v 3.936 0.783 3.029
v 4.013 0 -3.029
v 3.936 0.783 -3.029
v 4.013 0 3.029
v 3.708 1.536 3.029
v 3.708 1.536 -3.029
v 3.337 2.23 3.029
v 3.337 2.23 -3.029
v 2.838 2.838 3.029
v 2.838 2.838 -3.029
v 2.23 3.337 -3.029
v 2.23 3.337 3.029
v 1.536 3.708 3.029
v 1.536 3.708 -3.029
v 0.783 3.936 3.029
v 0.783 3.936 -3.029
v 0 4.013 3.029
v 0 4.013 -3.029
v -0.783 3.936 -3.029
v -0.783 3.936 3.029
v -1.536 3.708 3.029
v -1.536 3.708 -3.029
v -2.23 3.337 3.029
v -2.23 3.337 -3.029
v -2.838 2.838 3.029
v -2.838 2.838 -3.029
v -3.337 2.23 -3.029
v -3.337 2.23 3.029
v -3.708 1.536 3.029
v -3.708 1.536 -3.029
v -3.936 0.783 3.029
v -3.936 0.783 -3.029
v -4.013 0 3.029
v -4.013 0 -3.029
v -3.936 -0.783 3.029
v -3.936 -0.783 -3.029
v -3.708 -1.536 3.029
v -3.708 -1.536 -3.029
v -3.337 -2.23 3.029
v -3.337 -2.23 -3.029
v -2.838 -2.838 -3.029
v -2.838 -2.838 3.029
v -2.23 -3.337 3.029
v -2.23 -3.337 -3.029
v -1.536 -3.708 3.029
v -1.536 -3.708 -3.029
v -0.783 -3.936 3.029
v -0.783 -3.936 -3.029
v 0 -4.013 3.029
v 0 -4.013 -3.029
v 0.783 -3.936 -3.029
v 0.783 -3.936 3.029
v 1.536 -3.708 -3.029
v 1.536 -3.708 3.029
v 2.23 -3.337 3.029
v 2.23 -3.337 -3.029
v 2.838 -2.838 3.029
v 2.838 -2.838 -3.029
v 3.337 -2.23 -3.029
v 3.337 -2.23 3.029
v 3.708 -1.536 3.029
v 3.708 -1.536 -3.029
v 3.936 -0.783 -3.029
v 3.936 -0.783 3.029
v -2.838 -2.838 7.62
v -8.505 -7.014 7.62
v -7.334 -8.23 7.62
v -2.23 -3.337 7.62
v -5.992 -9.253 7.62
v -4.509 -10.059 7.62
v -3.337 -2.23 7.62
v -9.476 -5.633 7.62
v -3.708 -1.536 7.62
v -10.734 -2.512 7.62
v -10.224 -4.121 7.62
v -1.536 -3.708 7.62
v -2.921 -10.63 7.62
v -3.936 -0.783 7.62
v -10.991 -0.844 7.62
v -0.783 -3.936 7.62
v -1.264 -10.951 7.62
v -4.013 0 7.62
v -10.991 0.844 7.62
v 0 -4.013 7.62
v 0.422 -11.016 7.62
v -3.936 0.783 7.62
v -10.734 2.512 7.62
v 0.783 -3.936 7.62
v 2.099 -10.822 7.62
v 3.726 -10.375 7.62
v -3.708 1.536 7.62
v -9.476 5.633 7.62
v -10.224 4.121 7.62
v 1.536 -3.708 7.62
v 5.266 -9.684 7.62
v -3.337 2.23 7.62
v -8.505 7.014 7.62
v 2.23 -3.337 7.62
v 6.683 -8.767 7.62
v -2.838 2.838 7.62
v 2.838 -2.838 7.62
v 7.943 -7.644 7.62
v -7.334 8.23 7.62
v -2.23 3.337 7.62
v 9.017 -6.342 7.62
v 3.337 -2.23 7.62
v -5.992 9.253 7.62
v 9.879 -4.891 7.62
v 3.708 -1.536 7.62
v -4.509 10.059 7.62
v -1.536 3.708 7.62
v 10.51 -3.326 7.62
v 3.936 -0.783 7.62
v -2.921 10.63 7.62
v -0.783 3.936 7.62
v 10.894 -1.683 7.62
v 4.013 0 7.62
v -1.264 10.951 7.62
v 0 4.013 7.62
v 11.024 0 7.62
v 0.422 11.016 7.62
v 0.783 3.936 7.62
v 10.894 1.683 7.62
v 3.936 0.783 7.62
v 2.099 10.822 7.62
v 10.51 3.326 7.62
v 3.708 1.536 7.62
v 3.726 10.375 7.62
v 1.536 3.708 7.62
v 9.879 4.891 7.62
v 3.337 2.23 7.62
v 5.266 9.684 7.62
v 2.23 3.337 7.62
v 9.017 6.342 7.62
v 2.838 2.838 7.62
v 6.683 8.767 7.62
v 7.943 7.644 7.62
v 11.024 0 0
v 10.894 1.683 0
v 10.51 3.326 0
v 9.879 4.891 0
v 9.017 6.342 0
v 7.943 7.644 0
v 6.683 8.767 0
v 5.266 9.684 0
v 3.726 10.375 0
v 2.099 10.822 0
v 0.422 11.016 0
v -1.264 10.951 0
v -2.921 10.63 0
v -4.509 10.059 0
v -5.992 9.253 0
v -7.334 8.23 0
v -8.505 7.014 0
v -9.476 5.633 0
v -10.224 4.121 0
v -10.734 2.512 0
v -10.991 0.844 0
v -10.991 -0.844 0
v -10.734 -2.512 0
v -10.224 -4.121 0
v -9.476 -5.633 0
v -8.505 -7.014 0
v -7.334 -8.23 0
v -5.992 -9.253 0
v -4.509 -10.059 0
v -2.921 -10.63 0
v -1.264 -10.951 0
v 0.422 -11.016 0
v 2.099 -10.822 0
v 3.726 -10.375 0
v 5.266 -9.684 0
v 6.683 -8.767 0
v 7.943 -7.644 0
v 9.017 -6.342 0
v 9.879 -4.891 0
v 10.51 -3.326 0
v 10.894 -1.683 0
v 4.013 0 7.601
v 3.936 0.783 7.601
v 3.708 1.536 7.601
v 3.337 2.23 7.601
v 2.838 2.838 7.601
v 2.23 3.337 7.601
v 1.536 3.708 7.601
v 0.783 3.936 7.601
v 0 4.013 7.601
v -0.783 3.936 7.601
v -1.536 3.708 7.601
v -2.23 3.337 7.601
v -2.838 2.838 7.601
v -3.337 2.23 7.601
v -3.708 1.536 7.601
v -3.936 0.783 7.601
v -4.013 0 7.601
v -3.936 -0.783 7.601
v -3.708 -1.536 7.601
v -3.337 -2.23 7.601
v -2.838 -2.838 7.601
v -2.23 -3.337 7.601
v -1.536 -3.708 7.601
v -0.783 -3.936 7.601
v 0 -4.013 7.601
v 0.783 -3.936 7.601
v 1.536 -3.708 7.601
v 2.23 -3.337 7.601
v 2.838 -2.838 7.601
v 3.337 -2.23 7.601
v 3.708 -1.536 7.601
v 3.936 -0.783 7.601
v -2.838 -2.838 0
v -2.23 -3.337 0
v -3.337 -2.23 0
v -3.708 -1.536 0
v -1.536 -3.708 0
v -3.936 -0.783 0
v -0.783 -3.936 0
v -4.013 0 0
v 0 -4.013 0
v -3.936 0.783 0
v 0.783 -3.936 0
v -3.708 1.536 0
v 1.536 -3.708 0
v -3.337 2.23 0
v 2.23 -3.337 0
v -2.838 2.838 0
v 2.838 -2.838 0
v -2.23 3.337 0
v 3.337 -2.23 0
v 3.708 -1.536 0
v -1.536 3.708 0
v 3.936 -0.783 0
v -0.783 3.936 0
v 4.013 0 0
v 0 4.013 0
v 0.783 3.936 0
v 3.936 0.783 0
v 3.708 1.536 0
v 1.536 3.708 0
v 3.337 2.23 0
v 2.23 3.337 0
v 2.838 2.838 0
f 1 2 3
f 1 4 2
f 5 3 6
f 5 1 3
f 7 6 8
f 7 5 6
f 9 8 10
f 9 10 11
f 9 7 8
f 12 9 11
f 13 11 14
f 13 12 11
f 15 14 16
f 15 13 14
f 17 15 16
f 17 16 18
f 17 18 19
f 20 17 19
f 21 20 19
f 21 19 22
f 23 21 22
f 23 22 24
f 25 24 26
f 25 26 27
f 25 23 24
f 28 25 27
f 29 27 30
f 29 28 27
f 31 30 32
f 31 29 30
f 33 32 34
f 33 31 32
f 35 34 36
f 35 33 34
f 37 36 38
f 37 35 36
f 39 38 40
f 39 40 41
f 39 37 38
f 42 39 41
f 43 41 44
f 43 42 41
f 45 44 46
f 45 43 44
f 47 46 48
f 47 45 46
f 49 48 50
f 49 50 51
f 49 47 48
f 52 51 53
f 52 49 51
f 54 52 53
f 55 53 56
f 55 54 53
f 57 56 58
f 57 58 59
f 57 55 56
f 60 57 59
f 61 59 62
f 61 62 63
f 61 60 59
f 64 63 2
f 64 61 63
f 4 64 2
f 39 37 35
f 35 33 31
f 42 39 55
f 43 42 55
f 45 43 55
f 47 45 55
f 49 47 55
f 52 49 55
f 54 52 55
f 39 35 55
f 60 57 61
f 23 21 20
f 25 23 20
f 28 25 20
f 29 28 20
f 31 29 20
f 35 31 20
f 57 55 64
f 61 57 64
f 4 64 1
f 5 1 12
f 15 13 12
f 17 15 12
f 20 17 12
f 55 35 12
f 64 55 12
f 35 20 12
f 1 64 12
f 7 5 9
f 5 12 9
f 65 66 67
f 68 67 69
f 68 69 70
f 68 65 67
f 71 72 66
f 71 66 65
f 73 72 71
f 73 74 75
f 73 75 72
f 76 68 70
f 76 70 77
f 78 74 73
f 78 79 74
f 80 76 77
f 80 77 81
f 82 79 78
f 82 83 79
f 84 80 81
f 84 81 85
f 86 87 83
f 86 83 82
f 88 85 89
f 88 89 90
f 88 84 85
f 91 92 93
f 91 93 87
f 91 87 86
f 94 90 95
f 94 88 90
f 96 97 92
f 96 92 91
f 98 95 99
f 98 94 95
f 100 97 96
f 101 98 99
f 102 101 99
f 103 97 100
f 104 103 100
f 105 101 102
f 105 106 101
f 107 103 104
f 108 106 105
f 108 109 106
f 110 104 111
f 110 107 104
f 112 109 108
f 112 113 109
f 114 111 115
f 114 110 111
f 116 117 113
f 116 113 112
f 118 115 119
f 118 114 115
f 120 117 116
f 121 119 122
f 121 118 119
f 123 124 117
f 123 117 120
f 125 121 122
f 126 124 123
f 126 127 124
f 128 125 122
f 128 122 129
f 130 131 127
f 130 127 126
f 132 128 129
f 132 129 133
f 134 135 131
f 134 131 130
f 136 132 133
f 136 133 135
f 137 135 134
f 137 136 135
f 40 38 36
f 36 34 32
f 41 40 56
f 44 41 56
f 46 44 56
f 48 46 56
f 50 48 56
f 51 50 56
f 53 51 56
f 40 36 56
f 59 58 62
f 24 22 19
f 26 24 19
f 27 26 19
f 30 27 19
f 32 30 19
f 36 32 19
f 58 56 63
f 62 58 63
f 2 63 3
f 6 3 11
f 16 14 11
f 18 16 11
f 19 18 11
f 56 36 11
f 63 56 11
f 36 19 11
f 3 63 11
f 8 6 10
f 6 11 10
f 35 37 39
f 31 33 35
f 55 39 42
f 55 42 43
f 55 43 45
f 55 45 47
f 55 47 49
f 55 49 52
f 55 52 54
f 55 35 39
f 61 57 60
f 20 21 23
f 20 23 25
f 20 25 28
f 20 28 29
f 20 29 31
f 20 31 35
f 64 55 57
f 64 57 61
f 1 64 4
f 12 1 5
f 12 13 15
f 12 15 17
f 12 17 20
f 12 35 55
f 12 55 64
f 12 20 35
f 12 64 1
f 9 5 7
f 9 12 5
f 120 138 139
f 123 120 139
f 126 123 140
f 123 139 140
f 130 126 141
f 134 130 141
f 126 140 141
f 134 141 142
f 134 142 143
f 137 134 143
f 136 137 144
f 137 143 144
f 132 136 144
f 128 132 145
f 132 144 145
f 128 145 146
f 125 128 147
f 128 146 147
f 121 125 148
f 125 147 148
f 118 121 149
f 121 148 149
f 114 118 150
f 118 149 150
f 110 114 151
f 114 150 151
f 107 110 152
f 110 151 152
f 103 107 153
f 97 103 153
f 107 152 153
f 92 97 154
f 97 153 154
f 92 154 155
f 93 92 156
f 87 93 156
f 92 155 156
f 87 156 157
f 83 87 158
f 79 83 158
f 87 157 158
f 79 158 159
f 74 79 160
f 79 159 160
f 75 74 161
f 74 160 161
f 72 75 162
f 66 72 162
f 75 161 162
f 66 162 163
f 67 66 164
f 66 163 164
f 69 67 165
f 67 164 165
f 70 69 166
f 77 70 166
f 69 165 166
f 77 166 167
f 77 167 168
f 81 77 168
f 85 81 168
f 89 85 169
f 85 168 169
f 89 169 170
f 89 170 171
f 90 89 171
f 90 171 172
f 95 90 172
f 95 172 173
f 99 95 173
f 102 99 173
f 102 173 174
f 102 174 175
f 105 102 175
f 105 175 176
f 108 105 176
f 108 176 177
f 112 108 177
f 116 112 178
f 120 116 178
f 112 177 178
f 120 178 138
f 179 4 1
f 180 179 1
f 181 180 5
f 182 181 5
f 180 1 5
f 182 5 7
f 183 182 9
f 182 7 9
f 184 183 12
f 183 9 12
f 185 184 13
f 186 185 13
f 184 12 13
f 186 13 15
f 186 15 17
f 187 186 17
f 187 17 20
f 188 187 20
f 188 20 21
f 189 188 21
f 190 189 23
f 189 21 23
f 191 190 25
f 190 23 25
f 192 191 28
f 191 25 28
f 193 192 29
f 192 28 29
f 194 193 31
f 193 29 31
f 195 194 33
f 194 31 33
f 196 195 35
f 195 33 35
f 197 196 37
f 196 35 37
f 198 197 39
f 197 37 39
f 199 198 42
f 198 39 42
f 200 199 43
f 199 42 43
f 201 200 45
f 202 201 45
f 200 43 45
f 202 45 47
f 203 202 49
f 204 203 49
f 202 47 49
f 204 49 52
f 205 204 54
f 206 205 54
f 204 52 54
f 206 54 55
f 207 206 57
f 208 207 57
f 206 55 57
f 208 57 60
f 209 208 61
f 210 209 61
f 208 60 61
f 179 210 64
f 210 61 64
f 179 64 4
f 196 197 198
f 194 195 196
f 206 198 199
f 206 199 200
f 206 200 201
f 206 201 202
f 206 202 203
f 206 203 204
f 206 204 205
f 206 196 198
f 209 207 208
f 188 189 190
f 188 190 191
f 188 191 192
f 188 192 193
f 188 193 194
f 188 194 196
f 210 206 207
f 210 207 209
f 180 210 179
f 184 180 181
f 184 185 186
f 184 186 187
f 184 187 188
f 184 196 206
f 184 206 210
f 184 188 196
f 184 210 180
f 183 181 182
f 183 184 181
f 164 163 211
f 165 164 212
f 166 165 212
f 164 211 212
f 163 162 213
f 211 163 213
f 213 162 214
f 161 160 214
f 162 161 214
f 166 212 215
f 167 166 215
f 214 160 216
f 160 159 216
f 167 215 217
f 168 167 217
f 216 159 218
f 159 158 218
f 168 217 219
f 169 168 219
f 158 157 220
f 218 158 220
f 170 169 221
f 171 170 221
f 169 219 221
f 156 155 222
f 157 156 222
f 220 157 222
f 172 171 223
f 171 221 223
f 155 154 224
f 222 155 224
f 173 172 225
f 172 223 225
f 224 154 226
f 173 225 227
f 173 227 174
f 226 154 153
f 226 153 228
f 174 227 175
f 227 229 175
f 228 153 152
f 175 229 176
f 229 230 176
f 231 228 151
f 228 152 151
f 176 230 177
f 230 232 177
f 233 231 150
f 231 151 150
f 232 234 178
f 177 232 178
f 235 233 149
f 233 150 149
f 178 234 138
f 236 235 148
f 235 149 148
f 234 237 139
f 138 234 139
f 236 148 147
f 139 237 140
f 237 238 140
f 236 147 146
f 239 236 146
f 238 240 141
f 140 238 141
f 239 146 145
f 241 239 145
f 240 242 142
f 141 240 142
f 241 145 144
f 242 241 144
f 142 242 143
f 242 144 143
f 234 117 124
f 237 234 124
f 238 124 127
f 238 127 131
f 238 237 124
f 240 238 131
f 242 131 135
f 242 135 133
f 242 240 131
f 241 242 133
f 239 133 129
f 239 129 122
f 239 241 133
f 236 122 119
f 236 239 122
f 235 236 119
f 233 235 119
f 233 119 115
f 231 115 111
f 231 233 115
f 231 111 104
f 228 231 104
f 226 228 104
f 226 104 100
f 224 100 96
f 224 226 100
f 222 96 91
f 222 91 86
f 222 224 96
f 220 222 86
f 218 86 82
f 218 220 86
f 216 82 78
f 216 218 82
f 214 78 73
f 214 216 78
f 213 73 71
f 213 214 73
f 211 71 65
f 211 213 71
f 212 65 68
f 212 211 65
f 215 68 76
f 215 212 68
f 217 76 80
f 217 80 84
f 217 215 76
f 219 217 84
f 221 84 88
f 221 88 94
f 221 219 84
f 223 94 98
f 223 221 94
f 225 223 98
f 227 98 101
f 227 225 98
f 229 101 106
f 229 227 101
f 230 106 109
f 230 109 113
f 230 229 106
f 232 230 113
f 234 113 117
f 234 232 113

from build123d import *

# Parameters (mm, degrees)
F0_R     = 4.0132
F1_DEPTH = 3.02895
F0_R_2   = 11.0236
F2_DEPTH = 7.62
F3_R     = 4.0132
F4_DEPTH = 4.572


with BuildPart() as f1:
    # F0 (on Top) → F1 (new body, symmetric)
    with BuildSketch(Plane.XY):
        Circle(F0_R)
    extrude(amount=F1_DEPTH, both=True)


with BuildPart() as f2:
    # F0 (on Top) → F2 (new body)
    with BuildSketch(Plane.XY):
        Circle(F0_R_2)
        Circle(F0_R, mode=Mode.SUBTRACT)
    extrude(amount=F2_DEPTH)


with BuildPart() as f4:
    # F3 (on face) → F4 (new body)
    with BuildSketch(Plane.XY.offset(3.02895)):
        Circle(F3_R)
    extrude(amount=F4_DEPTH)


solid = Compound([f1.part, f2.part, f4.part])
